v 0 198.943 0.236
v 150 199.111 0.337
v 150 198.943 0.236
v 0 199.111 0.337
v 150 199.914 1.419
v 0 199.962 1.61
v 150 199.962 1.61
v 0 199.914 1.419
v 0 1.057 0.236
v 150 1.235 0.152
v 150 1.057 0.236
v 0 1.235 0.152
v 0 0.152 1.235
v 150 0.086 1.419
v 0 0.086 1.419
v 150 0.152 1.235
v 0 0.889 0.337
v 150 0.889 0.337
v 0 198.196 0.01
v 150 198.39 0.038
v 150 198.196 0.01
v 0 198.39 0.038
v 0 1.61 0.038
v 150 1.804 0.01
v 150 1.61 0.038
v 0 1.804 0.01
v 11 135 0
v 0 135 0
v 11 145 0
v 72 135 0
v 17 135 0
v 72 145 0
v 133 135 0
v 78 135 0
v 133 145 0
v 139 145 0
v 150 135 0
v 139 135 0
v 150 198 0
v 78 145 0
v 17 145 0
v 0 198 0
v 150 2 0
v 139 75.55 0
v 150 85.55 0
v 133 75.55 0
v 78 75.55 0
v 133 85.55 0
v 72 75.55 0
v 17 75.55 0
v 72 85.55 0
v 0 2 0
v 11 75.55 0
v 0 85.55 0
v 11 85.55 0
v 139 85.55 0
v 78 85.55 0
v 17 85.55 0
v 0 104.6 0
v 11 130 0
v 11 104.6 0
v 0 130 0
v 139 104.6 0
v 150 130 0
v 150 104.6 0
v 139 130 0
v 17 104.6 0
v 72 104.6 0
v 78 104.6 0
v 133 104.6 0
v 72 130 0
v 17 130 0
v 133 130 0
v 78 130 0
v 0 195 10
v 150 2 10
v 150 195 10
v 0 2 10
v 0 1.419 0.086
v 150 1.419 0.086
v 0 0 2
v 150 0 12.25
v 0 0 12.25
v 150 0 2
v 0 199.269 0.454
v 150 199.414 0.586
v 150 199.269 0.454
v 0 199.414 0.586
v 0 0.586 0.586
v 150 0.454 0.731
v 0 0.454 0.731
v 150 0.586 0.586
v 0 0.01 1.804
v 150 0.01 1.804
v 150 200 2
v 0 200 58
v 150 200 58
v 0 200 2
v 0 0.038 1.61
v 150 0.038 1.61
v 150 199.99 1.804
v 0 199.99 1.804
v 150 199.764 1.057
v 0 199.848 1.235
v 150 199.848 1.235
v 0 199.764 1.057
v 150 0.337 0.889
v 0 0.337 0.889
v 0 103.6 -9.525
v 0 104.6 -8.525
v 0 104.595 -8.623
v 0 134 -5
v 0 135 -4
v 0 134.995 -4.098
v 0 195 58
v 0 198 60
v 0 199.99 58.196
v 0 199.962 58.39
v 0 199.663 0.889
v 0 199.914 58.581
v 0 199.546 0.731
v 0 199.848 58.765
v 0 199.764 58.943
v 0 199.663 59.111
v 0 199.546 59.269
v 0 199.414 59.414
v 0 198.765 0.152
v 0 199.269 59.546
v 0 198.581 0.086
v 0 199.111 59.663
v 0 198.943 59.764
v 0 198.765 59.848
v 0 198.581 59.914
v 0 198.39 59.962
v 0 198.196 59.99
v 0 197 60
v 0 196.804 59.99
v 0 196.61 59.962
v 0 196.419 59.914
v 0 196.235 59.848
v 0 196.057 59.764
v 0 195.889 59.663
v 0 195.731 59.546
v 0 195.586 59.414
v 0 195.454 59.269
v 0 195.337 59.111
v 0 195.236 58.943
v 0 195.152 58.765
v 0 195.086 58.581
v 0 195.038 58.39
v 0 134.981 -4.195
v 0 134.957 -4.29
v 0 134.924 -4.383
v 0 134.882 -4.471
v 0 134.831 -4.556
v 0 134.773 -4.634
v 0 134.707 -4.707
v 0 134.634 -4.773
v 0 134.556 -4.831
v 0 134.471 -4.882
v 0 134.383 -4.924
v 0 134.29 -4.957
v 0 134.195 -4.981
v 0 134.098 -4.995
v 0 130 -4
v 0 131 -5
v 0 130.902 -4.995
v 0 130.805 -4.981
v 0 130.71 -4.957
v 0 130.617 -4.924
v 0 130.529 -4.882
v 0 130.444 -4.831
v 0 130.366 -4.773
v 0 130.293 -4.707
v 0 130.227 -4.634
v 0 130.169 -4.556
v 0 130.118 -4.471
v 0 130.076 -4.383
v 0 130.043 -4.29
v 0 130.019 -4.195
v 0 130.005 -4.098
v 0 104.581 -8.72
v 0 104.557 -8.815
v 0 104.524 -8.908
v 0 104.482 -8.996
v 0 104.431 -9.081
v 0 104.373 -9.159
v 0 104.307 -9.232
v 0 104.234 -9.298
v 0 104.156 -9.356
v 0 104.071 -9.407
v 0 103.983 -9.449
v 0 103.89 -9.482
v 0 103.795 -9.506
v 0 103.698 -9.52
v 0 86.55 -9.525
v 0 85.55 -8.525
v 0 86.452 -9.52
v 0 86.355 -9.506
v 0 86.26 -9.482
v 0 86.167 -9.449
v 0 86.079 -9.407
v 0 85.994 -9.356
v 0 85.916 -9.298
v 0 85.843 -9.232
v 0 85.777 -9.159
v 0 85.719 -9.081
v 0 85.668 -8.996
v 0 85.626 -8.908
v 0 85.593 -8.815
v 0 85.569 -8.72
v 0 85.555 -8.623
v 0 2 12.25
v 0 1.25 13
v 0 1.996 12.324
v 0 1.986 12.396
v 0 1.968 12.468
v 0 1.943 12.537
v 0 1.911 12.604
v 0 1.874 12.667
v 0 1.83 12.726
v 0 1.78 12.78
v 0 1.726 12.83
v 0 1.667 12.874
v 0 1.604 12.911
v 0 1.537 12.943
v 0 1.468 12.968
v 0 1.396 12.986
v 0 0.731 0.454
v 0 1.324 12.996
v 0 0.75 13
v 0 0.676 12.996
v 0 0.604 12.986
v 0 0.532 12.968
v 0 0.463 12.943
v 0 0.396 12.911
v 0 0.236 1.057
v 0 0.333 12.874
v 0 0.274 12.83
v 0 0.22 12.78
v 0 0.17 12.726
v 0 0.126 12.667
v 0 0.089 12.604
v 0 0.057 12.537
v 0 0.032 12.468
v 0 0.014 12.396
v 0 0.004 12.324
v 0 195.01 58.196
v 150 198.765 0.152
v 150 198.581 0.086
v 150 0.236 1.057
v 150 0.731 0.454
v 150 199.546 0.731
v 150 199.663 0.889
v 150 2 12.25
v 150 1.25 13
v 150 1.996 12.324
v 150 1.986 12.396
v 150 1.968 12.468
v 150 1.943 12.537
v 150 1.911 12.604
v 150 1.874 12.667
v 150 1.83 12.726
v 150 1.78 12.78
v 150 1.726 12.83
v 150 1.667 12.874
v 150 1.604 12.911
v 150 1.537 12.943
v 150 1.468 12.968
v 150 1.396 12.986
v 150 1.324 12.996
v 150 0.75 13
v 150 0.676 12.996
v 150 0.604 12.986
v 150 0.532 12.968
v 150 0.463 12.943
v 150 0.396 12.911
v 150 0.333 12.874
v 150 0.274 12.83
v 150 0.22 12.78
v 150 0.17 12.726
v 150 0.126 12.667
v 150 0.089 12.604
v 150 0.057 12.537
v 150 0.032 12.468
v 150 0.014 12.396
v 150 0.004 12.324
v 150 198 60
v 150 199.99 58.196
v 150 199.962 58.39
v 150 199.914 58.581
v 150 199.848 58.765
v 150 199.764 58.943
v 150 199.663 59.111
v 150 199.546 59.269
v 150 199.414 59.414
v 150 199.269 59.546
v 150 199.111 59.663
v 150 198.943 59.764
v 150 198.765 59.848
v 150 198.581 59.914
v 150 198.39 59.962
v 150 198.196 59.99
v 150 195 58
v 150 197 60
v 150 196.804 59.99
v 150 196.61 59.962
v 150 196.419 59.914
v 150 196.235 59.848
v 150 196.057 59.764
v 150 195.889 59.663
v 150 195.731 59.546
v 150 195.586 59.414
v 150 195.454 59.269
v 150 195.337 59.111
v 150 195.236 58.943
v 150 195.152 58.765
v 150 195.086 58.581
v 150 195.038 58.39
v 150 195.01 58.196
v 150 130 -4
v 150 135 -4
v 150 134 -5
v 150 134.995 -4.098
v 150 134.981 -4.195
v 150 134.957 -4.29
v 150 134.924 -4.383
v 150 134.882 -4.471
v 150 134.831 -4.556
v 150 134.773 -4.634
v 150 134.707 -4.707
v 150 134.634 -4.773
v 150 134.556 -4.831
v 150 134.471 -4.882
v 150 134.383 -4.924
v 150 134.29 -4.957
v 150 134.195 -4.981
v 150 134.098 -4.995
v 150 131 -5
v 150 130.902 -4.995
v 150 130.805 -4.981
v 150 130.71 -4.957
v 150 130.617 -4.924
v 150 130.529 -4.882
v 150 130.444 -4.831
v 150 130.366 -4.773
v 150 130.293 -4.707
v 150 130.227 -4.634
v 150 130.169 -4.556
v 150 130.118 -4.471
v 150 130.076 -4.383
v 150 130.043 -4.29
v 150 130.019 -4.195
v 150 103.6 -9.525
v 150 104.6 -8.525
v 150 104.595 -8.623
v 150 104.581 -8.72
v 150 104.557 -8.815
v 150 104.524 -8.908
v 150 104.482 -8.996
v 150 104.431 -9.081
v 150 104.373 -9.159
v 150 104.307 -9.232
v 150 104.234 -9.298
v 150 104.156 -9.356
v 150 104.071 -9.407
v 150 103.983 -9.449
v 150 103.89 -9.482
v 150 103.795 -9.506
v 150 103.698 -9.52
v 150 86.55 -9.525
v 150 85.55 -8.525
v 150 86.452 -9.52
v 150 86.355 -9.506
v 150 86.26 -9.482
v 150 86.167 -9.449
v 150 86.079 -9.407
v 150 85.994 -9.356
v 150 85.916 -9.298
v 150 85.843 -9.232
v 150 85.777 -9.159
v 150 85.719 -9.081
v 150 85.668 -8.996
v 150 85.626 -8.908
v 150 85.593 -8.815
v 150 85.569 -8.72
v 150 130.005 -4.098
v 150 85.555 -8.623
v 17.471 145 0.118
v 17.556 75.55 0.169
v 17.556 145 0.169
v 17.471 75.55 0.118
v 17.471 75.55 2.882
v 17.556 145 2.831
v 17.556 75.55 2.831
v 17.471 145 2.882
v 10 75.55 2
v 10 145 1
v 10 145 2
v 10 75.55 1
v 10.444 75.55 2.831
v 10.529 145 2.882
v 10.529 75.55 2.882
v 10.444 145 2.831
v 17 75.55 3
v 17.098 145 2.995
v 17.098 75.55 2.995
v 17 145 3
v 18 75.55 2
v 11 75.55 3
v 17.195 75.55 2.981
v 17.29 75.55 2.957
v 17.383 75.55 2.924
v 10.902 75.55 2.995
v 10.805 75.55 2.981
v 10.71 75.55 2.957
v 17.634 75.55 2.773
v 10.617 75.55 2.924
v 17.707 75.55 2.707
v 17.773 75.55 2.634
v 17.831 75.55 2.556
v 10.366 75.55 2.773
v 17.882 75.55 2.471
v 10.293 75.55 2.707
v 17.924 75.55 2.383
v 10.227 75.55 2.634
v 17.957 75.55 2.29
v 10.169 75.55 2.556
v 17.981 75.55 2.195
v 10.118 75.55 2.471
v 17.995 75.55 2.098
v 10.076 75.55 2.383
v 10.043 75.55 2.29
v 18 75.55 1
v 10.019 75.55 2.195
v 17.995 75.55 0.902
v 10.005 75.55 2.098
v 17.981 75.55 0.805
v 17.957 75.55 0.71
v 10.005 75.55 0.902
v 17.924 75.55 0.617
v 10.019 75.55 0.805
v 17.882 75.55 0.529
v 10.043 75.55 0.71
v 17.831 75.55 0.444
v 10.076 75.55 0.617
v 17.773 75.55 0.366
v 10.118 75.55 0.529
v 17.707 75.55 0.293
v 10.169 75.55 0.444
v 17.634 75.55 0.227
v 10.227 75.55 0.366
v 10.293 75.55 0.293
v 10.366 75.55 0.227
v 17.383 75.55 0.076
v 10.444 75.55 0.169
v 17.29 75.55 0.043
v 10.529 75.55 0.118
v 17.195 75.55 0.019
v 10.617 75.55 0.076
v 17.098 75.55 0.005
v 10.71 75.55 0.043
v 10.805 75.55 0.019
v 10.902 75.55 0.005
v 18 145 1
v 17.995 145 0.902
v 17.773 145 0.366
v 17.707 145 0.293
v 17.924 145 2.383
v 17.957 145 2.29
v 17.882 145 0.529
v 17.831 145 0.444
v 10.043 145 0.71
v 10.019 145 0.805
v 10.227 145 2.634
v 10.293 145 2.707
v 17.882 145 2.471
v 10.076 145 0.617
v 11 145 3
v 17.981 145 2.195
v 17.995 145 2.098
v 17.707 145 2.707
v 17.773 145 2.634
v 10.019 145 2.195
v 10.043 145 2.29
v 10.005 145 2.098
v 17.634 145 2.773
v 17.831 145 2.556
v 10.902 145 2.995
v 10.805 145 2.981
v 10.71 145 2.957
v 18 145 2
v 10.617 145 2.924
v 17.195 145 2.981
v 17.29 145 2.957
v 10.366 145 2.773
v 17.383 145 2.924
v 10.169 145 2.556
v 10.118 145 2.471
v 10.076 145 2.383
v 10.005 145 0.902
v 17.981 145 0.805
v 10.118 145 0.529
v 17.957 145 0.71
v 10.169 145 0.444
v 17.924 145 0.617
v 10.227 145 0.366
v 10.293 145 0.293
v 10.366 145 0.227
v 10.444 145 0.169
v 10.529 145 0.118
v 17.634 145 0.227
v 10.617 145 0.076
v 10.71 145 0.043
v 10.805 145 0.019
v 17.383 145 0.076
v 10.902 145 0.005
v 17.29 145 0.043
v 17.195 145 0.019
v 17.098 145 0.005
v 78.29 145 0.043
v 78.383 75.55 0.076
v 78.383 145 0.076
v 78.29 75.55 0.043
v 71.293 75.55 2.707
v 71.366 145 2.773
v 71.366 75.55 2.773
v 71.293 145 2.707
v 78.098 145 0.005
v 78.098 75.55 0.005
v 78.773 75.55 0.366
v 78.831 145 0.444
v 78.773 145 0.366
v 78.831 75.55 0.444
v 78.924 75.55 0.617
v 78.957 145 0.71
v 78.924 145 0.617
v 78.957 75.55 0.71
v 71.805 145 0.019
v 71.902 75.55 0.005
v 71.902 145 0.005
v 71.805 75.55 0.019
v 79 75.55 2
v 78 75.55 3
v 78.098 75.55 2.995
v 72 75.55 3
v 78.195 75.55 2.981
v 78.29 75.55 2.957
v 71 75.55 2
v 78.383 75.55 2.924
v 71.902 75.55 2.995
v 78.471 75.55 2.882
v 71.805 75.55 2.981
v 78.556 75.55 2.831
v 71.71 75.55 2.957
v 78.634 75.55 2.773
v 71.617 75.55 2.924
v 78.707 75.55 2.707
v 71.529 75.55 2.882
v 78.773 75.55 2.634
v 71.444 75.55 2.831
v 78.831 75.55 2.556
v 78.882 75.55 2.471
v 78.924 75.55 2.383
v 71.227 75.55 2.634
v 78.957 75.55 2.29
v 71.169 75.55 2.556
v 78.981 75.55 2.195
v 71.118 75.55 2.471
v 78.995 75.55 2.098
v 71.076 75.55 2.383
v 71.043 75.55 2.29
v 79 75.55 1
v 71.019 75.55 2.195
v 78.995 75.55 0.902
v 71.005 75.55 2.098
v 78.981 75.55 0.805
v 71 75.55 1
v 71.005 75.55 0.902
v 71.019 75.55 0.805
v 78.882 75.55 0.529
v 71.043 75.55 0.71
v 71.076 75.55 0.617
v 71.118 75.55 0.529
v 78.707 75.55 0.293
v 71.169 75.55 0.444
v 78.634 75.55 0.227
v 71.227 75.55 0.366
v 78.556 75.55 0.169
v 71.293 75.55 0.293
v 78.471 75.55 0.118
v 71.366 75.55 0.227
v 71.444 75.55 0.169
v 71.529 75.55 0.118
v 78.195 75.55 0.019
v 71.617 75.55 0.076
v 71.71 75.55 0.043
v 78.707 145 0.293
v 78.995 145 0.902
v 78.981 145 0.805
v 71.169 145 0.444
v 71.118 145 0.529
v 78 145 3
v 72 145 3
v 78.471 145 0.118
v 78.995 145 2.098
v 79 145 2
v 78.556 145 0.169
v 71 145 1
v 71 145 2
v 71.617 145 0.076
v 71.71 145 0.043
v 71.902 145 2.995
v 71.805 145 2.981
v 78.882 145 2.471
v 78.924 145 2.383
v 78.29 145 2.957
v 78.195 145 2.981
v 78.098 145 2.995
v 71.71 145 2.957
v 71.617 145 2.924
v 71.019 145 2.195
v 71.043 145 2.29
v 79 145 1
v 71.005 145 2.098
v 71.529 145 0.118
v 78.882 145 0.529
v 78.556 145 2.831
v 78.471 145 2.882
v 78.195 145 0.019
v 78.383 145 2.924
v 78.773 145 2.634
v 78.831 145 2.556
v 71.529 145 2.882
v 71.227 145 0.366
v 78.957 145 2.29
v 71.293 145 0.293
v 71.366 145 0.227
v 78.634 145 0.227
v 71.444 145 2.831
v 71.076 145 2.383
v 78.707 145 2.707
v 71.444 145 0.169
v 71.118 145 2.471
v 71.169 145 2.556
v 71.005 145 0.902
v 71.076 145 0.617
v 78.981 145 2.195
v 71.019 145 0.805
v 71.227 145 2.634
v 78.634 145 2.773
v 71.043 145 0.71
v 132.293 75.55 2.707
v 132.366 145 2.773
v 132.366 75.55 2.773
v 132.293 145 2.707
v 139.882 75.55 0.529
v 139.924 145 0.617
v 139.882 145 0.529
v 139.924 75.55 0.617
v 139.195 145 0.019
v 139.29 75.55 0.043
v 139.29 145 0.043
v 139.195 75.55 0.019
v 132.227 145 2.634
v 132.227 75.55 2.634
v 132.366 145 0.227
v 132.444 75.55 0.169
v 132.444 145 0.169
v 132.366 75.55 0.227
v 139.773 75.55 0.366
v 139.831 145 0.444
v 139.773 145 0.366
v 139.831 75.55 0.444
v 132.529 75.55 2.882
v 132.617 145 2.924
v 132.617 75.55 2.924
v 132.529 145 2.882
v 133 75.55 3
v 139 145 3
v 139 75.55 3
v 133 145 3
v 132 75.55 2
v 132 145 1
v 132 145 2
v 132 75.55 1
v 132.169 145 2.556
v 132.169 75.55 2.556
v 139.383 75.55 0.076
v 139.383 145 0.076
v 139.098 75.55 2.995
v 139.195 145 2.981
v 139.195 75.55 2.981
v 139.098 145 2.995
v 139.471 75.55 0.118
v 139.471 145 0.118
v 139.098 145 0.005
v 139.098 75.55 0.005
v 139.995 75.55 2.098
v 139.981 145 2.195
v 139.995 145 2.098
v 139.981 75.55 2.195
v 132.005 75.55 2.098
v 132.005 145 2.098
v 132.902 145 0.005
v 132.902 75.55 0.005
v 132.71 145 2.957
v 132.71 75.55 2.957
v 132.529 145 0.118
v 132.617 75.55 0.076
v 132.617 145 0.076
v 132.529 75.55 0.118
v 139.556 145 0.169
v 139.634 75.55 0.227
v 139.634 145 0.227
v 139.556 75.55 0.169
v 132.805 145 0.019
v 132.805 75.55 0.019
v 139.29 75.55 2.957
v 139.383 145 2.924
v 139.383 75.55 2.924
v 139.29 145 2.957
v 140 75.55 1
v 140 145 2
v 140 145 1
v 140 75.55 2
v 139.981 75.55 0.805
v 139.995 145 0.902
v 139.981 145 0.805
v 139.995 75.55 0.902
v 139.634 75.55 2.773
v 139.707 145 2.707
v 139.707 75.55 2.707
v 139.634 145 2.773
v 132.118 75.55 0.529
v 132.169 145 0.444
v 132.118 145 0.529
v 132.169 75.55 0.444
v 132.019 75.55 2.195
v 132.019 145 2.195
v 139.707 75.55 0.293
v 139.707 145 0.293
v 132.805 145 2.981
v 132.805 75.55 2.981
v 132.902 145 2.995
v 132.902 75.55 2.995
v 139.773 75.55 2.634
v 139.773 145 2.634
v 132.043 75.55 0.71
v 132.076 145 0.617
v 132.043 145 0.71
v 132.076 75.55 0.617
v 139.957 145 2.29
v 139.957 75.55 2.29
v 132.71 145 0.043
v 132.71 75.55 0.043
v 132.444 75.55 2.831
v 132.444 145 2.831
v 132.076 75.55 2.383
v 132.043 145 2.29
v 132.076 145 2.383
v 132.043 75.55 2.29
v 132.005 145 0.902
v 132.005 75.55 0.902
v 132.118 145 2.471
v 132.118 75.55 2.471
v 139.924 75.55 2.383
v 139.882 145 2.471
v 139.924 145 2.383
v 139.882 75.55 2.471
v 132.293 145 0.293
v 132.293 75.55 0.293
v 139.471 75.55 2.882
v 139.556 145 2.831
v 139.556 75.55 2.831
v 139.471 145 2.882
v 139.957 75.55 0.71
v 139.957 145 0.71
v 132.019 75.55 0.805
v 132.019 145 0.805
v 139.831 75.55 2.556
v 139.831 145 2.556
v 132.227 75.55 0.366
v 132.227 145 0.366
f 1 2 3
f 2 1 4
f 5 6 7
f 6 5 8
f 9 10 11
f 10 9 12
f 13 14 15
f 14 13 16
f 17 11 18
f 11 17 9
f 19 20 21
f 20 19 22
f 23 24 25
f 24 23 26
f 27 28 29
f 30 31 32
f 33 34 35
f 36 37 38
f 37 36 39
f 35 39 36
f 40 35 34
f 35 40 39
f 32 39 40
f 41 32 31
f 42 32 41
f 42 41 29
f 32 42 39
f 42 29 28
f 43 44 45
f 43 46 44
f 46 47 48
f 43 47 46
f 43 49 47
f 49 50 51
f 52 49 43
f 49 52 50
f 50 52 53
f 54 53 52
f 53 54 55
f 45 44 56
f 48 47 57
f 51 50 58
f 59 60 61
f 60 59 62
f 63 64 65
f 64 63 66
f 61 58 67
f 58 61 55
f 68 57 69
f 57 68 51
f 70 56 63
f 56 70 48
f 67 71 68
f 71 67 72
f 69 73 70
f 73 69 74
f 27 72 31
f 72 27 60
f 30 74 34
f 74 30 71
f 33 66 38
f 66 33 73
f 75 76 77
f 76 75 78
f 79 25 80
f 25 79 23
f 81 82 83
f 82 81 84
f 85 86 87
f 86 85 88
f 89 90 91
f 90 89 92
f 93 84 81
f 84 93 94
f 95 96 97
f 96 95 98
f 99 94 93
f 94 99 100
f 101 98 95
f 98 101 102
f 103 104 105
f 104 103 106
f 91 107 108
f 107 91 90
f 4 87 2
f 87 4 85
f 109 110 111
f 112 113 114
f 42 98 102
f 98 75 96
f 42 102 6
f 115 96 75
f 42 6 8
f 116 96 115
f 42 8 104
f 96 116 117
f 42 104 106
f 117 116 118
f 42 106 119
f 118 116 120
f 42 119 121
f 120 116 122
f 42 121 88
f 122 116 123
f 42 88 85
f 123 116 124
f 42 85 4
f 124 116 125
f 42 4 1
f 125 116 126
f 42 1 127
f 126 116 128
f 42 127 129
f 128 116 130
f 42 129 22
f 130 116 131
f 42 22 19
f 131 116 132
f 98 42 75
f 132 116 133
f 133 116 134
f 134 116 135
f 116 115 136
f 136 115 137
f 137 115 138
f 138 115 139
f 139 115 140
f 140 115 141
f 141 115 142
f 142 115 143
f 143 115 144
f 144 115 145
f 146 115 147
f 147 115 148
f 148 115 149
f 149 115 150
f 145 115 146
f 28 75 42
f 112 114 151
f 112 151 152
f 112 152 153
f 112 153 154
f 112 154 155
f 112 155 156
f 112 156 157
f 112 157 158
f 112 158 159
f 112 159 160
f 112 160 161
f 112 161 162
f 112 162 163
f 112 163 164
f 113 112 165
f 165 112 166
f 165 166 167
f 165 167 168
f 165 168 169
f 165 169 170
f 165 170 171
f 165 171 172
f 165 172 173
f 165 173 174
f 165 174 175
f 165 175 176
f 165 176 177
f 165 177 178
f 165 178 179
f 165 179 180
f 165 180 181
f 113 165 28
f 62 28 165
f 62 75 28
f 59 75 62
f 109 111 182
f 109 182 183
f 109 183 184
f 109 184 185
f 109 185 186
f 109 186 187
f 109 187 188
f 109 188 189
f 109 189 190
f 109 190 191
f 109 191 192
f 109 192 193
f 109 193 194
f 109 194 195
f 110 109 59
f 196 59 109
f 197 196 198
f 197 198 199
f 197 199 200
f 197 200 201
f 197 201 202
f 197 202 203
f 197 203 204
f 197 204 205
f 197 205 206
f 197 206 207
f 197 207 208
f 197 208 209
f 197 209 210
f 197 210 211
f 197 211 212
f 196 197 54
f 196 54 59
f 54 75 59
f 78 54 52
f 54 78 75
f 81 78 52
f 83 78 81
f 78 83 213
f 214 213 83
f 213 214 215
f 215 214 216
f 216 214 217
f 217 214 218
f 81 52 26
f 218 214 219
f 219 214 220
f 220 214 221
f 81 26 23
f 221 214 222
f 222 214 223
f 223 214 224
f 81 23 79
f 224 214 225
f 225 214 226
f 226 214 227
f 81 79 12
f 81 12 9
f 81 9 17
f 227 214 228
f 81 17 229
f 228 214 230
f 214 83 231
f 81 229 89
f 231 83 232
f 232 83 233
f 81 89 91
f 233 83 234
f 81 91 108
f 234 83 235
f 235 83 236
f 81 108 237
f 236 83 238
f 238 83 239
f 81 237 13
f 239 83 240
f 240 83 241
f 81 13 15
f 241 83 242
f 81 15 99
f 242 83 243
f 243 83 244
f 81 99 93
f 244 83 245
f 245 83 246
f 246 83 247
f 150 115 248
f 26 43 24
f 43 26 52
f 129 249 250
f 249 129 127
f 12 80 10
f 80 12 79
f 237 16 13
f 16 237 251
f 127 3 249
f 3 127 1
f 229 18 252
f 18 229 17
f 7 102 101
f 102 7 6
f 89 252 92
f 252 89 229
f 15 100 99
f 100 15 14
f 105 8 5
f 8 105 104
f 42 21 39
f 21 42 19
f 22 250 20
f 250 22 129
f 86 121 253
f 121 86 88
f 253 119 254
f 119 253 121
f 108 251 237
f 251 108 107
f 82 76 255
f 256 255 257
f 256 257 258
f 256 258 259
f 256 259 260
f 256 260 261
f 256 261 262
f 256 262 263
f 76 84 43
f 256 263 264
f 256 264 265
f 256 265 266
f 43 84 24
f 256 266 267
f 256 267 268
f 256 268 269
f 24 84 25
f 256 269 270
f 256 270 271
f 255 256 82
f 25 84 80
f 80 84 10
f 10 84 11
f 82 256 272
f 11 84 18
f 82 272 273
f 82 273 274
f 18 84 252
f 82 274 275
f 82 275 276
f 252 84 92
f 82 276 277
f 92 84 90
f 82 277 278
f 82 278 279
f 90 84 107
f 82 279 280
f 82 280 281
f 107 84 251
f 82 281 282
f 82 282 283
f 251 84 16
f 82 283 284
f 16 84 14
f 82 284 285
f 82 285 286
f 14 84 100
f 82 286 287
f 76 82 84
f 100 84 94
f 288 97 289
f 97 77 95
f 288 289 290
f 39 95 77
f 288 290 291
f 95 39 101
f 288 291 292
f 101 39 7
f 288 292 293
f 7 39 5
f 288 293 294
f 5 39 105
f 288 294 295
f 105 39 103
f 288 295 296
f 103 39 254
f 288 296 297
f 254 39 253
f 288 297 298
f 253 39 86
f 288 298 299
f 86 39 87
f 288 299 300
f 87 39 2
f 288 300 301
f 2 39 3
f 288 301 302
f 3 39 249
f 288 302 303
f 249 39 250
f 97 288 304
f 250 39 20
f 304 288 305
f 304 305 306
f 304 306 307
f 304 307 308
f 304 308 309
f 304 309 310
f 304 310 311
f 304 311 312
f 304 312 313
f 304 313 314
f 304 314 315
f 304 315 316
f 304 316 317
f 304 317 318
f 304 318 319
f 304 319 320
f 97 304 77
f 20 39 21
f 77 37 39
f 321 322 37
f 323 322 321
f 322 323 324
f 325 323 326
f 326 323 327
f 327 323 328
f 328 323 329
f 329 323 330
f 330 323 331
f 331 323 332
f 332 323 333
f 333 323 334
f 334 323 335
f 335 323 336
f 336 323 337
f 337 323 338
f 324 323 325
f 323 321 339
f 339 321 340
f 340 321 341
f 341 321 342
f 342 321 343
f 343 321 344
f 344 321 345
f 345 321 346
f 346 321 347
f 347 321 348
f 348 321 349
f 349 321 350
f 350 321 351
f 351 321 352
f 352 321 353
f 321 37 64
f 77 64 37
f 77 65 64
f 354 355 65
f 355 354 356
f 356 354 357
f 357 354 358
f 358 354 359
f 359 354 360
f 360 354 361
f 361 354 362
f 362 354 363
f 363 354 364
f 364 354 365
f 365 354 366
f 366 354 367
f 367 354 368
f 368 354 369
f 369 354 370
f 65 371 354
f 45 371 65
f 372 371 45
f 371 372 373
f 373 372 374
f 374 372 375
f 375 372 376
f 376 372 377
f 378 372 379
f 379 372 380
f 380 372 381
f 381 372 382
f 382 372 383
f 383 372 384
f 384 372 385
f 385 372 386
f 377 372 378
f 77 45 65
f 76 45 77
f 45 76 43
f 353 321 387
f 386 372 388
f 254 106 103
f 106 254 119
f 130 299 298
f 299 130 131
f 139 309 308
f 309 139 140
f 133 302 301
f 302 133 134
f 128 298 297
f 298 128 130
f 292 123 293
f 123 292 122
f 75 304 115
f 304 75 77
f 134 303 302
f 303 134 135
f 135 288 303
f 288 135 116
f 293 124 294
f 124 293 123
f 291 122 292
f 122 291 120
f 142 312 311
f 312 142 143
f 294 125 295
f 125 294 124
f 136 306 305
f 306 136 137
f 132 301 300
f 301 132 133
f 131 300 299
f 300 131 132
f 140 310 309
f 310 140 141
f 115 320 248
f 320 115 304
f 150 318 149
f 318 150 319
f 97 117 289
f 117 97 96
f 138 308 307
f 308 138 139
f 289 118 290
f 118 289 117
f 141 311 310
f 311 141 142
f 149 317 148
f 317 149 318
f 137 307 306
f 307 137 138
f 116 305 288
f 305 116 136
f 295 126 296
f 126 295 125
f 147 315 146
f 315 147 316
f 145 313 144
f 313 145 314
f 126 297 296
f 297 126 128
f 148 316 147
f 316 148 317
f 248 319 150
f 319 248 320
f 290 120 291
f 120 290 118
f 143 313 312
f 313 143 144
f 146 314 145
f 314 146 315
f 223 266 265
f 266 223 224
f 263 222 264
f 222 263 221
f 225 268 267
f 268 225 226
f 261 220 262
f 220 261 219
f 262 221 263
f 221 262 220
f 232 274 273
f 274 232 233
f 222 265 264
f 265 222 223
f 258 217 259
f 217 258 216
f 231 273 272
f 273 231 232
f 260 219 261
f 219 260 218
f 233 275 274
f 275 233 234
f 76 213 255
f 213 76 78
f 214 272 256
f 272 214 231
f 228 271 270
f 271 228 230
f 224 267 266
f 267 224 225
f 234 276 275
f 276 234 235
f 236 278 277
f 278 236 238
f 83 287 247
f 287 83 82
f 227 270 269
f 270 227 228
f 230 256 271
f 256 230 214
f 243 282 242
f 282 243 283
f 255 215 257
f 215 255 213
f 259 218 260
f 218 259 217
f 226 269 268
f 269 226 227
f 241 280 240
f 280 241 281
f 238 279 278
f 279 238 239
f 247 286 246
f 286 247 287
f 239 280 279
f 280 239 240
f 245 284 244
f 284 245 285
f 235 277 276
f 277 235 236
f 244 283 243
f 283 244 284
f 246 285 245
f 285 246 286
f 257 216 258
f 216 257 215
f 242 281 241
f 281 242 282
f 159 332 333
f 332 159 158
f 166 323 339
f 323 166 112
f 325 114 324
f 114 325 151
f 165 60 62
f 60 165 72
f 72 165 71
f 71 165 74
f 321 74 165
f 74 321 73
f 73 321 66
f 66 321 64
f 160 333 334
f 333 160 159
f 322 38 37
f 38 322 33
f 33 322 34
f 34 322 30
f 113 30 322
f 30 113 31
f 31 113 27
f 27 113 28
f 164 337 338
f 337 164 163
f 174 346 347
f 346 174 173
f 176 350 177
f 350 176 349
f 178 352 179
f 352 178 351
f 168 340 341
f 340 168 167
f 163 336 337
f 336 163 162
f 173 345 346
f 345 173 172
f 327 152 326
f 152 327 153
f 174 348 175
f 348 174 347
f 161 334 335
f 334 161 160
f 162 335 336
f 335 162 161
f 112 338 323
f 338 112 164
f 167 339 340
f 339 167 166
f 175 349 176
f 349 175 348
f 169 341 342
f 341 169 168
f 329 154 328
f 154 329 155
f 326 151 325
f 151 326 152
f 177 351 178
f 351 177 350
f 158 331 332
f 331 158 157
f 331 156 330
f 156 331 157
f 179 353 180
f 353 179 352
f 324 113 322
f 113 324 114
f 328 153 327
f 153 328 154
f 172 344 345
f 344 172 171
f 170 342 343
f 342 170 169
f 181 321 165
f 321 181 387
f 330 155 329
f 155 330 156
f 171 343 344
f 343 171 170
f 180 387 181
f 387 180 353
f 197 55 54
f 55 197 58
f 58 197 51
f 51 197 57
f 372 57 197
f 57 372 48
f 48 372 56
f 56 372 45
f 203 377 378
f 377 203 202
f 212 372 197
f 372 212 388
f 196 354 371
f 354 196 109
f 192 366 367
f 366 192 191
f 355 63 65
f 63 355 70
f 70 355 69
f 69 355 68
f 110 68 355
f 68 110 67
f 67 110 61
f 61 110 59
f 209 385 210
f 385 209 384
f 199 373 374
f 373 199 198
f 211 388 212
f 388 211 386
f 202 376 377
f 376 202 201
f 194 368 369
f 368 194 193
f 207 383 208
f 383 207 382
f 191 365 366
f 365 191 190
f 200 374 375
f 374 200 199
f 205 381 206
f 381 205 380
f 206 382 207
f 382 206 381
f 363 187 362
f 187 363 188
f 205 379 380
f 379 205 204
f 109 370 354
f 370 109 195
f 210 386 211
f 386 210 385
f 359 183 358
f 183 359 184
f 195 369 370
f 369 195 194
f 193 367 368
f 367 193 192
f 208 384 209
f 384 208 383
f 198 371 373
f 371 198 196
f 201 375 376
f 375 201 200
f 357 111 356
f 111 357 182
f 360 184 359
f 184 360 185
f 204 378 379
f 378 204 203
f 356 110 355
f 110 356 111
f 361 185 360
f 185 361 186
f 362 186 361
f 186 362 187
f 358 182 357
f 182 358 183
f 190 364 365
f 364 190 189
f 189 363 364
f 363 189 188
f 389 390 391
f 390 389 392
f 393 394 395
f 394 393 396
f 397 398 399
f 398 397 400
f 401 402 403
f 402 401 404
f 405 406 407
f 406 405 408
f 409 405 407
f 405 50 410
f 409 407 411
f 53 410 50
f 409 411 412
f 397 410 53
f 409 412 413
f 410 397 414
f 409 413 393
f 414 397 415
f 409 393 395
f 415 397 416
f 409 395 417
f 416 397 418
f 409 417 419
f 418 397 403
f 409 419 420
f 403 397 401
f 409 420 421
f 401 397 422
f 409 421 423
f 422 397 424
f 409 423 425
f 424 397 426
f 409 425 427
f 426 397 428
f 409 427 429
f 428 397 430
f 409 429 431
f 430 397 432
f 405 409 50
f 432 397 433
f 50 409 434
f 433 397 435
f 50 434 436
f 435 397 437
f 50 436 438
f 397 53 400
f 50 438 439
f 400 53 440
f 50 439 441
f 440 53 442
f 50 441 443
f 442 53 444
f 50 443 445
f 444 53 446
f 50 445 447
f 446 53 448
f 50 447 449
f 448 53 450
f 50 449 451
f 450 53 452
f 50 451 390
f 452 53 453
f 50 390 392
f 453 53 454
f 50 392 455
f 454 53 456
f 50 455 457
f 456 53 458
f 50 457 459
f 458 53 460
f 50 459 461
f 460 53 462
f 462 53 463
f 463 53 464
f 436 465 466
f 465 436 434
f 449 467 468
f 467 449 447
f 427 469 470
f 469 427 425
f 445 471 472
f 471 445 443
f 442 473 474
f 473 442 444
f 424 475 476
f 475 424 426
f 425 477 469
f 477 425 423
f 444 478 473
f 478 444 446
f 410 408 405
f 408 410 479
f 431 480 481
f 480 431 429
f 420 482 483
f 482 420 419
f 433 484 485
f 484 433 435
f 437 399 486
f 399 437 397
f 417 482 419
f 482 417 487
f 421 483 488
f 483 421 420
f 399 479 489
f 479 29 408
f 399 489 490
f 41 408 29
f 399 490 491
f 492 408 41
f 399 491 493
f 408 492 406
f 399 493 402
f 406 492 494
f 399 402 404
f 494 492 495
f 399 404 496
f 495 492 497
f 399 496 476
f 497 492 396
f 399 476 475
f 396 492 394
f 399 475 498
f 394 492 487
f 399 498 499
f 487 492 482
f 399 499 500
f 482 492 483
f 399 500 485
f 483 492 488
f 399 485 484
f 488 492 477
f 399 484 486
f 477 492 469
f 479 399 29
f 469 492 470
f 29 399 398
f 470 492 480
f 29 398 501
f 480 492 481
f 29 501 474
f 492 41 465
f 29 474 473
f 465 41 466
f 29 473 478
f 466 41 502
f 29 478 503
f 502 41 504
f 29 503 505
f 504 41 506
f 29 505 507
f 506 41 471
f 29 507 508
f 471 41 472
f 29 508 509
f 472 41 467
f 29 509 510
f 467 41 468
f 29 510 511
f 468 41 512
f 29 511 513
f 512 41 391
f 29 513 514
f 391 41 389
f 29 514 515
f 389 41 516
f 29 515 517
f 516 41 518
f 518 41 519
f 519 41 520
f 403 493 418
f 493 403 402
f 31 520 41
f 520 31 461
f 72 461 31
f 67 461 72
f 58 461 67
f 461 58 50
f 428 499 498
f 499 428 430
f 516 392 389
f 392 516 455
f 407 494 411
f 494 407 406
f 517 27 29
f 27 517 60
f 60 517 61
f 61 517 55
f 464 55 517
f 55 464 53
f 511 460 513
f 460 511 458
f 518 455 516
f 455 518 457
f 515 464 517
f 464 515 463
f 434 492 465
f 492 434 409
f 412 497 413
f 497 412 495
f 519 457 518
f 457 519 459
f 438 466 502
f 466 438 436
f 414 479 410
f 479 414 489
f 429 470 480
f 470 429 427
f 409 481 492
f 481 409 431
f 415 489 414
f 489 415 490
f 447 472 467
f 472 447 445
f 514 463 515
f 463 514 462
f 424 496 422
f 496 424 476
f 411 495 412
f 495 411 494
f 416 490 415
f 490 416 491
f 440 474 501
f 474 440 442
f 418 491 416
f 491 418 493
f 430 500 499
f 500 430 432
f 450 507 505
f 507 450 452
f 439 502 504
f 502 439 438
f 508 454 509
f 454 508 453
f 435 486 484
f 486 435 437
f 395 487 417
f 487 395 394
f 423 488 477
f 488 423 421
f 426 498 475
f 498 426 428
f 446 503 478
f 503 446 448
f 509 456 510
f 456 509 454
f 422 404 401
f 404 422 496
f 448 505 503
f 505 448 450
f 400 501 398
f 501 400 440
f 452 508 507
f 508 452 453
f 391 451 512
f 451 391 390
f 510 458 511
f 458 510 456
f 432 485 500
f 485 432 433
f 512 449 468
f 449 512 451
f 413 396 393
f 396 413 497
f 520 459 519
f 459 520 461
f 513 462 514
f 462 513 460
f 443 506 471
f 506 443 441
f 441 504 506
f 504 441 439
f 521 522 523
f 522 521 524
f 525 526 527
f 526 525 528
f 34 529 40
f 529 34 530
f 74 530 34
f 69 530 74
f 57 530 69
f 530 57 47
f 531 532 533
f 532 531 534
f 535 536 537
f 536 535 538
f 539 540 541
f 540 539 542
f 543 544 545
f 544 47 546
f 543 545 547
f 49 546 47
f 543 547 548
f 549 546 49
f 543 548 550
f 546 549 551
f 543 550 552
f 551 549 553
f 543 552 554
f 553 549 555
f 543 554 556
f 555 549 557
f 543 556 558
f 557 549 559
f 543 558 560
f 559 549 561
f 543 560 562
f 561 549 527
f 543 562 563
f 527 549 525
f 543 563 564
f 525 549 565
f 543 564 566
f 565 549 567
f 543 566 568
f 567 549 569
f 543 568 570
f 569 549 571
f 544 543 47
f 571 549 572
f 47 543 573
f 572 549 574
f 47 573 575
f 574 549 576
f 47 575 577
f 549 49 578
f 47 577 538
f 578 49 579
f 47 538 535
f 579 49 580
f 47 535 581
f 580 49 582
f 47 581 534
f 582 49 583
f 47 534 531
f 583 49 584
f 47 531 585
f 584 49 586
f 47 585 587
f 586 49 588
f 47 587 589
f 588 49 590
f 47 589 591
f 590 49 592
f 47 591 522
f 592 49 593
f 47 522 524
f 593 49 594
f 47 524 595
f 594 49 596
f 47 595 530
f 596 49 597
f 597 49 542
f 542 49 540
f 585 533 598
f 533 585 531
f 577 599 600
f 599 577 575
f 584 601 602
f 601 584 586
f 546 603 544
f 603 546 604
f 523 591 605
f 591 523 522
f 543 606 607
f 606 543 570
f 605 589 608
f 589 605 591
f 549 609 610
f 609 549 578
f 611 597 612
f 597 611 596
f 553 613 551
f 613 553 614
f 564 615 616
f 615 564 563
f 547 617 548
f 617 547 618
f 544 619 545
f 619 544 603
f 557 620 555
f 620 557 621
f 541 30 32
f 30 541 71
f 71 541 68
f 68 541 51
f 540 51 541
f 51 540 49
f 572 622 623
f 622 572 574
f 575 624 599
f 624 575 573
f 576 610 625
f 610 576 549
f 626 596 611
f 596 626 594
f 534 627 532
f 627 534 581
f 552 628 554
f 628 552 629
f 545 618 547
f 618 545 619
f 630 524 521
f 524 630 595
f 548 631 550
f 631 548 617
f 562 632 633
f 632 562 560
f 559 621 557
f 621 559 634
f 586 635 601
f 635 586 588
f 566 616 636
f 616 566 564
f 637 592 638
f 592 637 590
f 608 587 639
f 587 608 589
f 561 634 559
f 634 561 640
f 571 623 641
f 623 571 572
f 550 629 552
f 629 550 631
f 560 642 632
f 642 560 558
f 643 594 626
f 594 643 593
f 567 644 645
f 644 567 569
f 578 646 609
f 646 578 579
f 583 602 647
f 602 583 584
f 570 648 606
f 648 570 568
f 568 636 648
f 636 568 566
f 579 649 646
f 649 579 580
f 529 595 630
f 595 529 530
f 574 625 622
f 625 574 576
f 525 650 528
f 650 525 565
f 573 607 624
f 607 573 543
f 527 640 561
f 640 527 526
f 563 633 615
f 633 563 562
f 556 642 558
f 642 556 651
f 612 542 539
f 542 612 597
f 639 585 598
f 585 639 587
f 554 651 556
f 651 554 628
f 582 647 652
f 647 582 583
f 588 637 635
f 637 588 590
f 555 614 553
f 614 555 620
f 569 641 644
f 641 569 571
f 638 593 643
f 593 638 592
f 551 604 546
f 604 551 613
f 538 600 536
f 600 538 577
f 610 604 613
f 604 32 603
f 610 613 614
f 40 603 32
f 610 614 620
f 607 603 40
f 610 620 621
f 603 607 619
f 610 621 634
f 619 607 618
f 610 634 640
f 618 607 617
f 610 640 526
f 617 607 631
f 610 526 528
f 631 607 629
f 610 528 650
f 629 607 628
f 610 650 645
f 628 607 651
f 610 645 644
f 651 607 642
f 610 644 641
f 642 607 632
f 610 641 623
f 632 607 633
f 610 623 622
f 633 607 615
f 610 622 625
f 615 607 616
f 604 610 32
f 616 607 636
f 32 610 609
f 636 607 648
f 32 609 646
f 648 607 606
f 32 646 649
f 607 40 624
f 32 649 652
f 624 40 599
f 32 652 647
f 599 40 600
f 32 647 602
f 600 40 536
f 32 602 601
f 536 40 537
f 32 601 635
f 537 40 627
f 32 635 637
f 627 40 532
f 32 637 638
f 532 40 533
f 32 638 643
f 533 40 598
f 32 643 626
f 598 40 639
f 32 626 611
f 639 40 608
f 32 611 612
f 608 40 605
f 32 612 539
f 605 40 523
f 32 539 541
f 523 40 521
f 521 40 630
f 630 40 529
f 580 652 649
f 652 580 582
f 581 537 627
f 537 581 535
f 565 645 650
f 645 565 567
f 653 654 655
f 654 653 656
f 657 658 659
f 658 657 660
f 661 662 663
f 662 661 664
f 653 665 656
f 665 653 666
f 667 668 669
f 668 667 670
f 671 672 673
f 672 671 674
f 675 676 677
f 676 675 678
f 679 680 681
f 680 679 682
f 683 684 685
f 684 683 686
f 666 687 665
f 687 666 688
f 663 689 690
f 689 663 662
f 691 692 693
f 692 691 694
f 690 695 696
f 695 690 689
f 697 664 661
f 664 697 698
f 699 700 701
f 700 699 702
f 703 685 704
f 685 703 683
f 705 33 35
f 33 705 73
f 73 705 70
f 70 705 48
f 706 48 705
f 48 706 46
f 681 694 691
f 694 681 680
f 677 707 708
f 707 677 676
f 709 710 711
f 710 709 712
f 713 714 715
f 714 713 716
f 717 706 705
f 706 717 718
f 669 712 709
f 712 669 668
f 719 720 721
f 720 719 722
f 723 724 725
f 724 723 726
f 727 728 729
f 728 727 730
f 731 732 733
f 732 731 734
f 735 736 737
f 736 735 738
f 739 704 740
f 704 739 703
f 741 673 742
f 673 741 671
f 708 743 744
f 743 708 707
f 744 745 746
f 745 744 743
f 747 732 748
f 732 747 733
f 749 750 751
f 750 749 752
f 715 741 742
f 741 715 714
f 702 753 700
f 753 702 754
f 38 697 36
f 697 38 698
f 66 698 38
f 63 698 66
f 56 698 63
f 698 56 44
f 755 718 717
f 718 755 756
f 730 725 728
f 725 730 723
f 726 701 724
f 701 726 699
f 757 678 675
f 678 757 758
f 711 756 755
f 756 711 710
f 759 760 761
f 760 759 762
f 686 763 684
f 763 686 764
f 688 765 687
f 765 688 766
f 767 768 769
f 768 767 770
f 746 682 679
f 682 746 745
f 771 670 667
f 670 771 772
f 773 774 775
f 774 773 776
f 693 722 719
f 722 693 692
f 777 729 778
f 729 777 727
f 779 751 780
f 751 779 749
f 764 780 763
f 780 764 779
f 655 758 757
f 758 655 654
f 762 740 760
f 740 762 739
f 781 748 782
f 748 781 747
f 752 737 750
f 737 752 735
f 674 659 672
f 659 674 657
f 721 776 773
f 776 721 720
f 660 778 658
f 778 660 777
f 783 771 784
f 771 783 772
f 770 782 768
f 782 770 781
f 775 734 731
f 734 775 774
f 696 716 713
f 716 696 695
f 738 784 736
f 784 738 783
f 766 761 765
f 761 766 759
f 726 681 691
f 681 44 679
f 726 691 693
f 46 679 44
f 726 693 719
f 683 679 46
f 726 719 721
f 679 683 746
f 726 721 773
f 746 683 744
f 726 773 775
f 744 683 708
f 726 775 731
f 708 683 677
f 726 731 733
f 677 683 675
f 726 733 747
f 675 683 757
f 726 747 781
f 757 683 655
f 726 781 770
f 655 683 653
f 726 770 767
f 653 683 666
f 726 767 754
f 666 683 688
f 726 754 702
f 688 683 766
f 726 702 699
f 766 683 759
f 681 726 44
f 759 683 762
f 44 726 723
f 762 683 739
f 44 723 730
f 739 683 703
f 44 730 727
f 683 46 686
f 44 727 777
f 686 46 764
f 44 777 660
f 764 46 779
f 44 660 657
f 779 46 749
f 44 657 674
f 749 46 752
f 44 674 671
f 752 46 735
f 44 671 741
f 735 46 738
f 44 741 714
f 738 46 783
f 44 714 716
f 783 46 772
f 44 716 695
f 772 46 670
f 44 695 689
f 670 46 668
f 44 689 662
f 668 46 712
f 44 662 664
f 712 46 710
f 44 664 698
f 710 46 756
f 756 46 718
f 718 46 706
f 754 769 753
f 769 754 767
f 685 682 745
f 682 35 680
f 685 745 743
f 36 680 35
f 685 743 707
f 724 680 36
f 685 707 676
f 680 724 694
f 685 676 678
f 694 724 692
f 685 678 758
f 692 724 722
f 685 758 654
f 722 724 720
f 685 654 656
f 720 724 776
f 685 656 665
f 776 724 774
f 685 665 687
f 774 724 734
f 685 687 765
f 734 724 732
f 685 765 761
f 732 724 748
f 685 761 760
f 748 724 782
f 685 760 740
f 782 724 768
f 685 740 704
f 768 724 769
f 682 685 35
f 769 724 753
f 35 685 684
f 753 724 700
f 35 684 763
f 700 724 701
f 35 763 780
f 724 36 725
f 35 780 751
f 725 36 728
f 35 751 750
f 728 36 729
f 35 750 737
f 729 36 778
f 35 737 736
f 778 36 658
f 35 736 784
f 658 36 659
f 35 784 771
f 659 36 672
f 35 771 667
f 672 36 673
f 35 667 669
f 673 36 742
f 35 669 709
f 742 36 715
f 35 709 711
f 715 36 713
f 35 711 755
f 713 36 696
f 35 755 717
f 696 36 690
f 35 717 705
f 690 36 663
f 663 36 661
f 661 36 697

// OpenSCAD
// file: 72-inch-cosco-profile.scad
// 72-inch Cosco shelf profile.
//
// Overrides the bar / front-lip dimensions in bar_shelf.scad to fit a
// 72-inch Cosco shelving rail. Include this BEFORE bar_shelf.scad in any
// wrapper that should use the Cosco profile.
border_ridge_override     = 25.4;    // 1"
border_depth_override     = 19.05;   // 3/4"
border_height_override    = 9.525;   // 3/8"
rear_wall_height_override = 5;       // shorter rear lip than 77-inch industrial
// main file
// 150mm-wide x 200mm-deep 72-inch Cosco shelf — see bar_shelf.scad for the design.
include <72-inch-cosco-profile.scad>
shelf_width_override = 150;
shelf_depth_override = 200;
include <bar_shelf.scad>
